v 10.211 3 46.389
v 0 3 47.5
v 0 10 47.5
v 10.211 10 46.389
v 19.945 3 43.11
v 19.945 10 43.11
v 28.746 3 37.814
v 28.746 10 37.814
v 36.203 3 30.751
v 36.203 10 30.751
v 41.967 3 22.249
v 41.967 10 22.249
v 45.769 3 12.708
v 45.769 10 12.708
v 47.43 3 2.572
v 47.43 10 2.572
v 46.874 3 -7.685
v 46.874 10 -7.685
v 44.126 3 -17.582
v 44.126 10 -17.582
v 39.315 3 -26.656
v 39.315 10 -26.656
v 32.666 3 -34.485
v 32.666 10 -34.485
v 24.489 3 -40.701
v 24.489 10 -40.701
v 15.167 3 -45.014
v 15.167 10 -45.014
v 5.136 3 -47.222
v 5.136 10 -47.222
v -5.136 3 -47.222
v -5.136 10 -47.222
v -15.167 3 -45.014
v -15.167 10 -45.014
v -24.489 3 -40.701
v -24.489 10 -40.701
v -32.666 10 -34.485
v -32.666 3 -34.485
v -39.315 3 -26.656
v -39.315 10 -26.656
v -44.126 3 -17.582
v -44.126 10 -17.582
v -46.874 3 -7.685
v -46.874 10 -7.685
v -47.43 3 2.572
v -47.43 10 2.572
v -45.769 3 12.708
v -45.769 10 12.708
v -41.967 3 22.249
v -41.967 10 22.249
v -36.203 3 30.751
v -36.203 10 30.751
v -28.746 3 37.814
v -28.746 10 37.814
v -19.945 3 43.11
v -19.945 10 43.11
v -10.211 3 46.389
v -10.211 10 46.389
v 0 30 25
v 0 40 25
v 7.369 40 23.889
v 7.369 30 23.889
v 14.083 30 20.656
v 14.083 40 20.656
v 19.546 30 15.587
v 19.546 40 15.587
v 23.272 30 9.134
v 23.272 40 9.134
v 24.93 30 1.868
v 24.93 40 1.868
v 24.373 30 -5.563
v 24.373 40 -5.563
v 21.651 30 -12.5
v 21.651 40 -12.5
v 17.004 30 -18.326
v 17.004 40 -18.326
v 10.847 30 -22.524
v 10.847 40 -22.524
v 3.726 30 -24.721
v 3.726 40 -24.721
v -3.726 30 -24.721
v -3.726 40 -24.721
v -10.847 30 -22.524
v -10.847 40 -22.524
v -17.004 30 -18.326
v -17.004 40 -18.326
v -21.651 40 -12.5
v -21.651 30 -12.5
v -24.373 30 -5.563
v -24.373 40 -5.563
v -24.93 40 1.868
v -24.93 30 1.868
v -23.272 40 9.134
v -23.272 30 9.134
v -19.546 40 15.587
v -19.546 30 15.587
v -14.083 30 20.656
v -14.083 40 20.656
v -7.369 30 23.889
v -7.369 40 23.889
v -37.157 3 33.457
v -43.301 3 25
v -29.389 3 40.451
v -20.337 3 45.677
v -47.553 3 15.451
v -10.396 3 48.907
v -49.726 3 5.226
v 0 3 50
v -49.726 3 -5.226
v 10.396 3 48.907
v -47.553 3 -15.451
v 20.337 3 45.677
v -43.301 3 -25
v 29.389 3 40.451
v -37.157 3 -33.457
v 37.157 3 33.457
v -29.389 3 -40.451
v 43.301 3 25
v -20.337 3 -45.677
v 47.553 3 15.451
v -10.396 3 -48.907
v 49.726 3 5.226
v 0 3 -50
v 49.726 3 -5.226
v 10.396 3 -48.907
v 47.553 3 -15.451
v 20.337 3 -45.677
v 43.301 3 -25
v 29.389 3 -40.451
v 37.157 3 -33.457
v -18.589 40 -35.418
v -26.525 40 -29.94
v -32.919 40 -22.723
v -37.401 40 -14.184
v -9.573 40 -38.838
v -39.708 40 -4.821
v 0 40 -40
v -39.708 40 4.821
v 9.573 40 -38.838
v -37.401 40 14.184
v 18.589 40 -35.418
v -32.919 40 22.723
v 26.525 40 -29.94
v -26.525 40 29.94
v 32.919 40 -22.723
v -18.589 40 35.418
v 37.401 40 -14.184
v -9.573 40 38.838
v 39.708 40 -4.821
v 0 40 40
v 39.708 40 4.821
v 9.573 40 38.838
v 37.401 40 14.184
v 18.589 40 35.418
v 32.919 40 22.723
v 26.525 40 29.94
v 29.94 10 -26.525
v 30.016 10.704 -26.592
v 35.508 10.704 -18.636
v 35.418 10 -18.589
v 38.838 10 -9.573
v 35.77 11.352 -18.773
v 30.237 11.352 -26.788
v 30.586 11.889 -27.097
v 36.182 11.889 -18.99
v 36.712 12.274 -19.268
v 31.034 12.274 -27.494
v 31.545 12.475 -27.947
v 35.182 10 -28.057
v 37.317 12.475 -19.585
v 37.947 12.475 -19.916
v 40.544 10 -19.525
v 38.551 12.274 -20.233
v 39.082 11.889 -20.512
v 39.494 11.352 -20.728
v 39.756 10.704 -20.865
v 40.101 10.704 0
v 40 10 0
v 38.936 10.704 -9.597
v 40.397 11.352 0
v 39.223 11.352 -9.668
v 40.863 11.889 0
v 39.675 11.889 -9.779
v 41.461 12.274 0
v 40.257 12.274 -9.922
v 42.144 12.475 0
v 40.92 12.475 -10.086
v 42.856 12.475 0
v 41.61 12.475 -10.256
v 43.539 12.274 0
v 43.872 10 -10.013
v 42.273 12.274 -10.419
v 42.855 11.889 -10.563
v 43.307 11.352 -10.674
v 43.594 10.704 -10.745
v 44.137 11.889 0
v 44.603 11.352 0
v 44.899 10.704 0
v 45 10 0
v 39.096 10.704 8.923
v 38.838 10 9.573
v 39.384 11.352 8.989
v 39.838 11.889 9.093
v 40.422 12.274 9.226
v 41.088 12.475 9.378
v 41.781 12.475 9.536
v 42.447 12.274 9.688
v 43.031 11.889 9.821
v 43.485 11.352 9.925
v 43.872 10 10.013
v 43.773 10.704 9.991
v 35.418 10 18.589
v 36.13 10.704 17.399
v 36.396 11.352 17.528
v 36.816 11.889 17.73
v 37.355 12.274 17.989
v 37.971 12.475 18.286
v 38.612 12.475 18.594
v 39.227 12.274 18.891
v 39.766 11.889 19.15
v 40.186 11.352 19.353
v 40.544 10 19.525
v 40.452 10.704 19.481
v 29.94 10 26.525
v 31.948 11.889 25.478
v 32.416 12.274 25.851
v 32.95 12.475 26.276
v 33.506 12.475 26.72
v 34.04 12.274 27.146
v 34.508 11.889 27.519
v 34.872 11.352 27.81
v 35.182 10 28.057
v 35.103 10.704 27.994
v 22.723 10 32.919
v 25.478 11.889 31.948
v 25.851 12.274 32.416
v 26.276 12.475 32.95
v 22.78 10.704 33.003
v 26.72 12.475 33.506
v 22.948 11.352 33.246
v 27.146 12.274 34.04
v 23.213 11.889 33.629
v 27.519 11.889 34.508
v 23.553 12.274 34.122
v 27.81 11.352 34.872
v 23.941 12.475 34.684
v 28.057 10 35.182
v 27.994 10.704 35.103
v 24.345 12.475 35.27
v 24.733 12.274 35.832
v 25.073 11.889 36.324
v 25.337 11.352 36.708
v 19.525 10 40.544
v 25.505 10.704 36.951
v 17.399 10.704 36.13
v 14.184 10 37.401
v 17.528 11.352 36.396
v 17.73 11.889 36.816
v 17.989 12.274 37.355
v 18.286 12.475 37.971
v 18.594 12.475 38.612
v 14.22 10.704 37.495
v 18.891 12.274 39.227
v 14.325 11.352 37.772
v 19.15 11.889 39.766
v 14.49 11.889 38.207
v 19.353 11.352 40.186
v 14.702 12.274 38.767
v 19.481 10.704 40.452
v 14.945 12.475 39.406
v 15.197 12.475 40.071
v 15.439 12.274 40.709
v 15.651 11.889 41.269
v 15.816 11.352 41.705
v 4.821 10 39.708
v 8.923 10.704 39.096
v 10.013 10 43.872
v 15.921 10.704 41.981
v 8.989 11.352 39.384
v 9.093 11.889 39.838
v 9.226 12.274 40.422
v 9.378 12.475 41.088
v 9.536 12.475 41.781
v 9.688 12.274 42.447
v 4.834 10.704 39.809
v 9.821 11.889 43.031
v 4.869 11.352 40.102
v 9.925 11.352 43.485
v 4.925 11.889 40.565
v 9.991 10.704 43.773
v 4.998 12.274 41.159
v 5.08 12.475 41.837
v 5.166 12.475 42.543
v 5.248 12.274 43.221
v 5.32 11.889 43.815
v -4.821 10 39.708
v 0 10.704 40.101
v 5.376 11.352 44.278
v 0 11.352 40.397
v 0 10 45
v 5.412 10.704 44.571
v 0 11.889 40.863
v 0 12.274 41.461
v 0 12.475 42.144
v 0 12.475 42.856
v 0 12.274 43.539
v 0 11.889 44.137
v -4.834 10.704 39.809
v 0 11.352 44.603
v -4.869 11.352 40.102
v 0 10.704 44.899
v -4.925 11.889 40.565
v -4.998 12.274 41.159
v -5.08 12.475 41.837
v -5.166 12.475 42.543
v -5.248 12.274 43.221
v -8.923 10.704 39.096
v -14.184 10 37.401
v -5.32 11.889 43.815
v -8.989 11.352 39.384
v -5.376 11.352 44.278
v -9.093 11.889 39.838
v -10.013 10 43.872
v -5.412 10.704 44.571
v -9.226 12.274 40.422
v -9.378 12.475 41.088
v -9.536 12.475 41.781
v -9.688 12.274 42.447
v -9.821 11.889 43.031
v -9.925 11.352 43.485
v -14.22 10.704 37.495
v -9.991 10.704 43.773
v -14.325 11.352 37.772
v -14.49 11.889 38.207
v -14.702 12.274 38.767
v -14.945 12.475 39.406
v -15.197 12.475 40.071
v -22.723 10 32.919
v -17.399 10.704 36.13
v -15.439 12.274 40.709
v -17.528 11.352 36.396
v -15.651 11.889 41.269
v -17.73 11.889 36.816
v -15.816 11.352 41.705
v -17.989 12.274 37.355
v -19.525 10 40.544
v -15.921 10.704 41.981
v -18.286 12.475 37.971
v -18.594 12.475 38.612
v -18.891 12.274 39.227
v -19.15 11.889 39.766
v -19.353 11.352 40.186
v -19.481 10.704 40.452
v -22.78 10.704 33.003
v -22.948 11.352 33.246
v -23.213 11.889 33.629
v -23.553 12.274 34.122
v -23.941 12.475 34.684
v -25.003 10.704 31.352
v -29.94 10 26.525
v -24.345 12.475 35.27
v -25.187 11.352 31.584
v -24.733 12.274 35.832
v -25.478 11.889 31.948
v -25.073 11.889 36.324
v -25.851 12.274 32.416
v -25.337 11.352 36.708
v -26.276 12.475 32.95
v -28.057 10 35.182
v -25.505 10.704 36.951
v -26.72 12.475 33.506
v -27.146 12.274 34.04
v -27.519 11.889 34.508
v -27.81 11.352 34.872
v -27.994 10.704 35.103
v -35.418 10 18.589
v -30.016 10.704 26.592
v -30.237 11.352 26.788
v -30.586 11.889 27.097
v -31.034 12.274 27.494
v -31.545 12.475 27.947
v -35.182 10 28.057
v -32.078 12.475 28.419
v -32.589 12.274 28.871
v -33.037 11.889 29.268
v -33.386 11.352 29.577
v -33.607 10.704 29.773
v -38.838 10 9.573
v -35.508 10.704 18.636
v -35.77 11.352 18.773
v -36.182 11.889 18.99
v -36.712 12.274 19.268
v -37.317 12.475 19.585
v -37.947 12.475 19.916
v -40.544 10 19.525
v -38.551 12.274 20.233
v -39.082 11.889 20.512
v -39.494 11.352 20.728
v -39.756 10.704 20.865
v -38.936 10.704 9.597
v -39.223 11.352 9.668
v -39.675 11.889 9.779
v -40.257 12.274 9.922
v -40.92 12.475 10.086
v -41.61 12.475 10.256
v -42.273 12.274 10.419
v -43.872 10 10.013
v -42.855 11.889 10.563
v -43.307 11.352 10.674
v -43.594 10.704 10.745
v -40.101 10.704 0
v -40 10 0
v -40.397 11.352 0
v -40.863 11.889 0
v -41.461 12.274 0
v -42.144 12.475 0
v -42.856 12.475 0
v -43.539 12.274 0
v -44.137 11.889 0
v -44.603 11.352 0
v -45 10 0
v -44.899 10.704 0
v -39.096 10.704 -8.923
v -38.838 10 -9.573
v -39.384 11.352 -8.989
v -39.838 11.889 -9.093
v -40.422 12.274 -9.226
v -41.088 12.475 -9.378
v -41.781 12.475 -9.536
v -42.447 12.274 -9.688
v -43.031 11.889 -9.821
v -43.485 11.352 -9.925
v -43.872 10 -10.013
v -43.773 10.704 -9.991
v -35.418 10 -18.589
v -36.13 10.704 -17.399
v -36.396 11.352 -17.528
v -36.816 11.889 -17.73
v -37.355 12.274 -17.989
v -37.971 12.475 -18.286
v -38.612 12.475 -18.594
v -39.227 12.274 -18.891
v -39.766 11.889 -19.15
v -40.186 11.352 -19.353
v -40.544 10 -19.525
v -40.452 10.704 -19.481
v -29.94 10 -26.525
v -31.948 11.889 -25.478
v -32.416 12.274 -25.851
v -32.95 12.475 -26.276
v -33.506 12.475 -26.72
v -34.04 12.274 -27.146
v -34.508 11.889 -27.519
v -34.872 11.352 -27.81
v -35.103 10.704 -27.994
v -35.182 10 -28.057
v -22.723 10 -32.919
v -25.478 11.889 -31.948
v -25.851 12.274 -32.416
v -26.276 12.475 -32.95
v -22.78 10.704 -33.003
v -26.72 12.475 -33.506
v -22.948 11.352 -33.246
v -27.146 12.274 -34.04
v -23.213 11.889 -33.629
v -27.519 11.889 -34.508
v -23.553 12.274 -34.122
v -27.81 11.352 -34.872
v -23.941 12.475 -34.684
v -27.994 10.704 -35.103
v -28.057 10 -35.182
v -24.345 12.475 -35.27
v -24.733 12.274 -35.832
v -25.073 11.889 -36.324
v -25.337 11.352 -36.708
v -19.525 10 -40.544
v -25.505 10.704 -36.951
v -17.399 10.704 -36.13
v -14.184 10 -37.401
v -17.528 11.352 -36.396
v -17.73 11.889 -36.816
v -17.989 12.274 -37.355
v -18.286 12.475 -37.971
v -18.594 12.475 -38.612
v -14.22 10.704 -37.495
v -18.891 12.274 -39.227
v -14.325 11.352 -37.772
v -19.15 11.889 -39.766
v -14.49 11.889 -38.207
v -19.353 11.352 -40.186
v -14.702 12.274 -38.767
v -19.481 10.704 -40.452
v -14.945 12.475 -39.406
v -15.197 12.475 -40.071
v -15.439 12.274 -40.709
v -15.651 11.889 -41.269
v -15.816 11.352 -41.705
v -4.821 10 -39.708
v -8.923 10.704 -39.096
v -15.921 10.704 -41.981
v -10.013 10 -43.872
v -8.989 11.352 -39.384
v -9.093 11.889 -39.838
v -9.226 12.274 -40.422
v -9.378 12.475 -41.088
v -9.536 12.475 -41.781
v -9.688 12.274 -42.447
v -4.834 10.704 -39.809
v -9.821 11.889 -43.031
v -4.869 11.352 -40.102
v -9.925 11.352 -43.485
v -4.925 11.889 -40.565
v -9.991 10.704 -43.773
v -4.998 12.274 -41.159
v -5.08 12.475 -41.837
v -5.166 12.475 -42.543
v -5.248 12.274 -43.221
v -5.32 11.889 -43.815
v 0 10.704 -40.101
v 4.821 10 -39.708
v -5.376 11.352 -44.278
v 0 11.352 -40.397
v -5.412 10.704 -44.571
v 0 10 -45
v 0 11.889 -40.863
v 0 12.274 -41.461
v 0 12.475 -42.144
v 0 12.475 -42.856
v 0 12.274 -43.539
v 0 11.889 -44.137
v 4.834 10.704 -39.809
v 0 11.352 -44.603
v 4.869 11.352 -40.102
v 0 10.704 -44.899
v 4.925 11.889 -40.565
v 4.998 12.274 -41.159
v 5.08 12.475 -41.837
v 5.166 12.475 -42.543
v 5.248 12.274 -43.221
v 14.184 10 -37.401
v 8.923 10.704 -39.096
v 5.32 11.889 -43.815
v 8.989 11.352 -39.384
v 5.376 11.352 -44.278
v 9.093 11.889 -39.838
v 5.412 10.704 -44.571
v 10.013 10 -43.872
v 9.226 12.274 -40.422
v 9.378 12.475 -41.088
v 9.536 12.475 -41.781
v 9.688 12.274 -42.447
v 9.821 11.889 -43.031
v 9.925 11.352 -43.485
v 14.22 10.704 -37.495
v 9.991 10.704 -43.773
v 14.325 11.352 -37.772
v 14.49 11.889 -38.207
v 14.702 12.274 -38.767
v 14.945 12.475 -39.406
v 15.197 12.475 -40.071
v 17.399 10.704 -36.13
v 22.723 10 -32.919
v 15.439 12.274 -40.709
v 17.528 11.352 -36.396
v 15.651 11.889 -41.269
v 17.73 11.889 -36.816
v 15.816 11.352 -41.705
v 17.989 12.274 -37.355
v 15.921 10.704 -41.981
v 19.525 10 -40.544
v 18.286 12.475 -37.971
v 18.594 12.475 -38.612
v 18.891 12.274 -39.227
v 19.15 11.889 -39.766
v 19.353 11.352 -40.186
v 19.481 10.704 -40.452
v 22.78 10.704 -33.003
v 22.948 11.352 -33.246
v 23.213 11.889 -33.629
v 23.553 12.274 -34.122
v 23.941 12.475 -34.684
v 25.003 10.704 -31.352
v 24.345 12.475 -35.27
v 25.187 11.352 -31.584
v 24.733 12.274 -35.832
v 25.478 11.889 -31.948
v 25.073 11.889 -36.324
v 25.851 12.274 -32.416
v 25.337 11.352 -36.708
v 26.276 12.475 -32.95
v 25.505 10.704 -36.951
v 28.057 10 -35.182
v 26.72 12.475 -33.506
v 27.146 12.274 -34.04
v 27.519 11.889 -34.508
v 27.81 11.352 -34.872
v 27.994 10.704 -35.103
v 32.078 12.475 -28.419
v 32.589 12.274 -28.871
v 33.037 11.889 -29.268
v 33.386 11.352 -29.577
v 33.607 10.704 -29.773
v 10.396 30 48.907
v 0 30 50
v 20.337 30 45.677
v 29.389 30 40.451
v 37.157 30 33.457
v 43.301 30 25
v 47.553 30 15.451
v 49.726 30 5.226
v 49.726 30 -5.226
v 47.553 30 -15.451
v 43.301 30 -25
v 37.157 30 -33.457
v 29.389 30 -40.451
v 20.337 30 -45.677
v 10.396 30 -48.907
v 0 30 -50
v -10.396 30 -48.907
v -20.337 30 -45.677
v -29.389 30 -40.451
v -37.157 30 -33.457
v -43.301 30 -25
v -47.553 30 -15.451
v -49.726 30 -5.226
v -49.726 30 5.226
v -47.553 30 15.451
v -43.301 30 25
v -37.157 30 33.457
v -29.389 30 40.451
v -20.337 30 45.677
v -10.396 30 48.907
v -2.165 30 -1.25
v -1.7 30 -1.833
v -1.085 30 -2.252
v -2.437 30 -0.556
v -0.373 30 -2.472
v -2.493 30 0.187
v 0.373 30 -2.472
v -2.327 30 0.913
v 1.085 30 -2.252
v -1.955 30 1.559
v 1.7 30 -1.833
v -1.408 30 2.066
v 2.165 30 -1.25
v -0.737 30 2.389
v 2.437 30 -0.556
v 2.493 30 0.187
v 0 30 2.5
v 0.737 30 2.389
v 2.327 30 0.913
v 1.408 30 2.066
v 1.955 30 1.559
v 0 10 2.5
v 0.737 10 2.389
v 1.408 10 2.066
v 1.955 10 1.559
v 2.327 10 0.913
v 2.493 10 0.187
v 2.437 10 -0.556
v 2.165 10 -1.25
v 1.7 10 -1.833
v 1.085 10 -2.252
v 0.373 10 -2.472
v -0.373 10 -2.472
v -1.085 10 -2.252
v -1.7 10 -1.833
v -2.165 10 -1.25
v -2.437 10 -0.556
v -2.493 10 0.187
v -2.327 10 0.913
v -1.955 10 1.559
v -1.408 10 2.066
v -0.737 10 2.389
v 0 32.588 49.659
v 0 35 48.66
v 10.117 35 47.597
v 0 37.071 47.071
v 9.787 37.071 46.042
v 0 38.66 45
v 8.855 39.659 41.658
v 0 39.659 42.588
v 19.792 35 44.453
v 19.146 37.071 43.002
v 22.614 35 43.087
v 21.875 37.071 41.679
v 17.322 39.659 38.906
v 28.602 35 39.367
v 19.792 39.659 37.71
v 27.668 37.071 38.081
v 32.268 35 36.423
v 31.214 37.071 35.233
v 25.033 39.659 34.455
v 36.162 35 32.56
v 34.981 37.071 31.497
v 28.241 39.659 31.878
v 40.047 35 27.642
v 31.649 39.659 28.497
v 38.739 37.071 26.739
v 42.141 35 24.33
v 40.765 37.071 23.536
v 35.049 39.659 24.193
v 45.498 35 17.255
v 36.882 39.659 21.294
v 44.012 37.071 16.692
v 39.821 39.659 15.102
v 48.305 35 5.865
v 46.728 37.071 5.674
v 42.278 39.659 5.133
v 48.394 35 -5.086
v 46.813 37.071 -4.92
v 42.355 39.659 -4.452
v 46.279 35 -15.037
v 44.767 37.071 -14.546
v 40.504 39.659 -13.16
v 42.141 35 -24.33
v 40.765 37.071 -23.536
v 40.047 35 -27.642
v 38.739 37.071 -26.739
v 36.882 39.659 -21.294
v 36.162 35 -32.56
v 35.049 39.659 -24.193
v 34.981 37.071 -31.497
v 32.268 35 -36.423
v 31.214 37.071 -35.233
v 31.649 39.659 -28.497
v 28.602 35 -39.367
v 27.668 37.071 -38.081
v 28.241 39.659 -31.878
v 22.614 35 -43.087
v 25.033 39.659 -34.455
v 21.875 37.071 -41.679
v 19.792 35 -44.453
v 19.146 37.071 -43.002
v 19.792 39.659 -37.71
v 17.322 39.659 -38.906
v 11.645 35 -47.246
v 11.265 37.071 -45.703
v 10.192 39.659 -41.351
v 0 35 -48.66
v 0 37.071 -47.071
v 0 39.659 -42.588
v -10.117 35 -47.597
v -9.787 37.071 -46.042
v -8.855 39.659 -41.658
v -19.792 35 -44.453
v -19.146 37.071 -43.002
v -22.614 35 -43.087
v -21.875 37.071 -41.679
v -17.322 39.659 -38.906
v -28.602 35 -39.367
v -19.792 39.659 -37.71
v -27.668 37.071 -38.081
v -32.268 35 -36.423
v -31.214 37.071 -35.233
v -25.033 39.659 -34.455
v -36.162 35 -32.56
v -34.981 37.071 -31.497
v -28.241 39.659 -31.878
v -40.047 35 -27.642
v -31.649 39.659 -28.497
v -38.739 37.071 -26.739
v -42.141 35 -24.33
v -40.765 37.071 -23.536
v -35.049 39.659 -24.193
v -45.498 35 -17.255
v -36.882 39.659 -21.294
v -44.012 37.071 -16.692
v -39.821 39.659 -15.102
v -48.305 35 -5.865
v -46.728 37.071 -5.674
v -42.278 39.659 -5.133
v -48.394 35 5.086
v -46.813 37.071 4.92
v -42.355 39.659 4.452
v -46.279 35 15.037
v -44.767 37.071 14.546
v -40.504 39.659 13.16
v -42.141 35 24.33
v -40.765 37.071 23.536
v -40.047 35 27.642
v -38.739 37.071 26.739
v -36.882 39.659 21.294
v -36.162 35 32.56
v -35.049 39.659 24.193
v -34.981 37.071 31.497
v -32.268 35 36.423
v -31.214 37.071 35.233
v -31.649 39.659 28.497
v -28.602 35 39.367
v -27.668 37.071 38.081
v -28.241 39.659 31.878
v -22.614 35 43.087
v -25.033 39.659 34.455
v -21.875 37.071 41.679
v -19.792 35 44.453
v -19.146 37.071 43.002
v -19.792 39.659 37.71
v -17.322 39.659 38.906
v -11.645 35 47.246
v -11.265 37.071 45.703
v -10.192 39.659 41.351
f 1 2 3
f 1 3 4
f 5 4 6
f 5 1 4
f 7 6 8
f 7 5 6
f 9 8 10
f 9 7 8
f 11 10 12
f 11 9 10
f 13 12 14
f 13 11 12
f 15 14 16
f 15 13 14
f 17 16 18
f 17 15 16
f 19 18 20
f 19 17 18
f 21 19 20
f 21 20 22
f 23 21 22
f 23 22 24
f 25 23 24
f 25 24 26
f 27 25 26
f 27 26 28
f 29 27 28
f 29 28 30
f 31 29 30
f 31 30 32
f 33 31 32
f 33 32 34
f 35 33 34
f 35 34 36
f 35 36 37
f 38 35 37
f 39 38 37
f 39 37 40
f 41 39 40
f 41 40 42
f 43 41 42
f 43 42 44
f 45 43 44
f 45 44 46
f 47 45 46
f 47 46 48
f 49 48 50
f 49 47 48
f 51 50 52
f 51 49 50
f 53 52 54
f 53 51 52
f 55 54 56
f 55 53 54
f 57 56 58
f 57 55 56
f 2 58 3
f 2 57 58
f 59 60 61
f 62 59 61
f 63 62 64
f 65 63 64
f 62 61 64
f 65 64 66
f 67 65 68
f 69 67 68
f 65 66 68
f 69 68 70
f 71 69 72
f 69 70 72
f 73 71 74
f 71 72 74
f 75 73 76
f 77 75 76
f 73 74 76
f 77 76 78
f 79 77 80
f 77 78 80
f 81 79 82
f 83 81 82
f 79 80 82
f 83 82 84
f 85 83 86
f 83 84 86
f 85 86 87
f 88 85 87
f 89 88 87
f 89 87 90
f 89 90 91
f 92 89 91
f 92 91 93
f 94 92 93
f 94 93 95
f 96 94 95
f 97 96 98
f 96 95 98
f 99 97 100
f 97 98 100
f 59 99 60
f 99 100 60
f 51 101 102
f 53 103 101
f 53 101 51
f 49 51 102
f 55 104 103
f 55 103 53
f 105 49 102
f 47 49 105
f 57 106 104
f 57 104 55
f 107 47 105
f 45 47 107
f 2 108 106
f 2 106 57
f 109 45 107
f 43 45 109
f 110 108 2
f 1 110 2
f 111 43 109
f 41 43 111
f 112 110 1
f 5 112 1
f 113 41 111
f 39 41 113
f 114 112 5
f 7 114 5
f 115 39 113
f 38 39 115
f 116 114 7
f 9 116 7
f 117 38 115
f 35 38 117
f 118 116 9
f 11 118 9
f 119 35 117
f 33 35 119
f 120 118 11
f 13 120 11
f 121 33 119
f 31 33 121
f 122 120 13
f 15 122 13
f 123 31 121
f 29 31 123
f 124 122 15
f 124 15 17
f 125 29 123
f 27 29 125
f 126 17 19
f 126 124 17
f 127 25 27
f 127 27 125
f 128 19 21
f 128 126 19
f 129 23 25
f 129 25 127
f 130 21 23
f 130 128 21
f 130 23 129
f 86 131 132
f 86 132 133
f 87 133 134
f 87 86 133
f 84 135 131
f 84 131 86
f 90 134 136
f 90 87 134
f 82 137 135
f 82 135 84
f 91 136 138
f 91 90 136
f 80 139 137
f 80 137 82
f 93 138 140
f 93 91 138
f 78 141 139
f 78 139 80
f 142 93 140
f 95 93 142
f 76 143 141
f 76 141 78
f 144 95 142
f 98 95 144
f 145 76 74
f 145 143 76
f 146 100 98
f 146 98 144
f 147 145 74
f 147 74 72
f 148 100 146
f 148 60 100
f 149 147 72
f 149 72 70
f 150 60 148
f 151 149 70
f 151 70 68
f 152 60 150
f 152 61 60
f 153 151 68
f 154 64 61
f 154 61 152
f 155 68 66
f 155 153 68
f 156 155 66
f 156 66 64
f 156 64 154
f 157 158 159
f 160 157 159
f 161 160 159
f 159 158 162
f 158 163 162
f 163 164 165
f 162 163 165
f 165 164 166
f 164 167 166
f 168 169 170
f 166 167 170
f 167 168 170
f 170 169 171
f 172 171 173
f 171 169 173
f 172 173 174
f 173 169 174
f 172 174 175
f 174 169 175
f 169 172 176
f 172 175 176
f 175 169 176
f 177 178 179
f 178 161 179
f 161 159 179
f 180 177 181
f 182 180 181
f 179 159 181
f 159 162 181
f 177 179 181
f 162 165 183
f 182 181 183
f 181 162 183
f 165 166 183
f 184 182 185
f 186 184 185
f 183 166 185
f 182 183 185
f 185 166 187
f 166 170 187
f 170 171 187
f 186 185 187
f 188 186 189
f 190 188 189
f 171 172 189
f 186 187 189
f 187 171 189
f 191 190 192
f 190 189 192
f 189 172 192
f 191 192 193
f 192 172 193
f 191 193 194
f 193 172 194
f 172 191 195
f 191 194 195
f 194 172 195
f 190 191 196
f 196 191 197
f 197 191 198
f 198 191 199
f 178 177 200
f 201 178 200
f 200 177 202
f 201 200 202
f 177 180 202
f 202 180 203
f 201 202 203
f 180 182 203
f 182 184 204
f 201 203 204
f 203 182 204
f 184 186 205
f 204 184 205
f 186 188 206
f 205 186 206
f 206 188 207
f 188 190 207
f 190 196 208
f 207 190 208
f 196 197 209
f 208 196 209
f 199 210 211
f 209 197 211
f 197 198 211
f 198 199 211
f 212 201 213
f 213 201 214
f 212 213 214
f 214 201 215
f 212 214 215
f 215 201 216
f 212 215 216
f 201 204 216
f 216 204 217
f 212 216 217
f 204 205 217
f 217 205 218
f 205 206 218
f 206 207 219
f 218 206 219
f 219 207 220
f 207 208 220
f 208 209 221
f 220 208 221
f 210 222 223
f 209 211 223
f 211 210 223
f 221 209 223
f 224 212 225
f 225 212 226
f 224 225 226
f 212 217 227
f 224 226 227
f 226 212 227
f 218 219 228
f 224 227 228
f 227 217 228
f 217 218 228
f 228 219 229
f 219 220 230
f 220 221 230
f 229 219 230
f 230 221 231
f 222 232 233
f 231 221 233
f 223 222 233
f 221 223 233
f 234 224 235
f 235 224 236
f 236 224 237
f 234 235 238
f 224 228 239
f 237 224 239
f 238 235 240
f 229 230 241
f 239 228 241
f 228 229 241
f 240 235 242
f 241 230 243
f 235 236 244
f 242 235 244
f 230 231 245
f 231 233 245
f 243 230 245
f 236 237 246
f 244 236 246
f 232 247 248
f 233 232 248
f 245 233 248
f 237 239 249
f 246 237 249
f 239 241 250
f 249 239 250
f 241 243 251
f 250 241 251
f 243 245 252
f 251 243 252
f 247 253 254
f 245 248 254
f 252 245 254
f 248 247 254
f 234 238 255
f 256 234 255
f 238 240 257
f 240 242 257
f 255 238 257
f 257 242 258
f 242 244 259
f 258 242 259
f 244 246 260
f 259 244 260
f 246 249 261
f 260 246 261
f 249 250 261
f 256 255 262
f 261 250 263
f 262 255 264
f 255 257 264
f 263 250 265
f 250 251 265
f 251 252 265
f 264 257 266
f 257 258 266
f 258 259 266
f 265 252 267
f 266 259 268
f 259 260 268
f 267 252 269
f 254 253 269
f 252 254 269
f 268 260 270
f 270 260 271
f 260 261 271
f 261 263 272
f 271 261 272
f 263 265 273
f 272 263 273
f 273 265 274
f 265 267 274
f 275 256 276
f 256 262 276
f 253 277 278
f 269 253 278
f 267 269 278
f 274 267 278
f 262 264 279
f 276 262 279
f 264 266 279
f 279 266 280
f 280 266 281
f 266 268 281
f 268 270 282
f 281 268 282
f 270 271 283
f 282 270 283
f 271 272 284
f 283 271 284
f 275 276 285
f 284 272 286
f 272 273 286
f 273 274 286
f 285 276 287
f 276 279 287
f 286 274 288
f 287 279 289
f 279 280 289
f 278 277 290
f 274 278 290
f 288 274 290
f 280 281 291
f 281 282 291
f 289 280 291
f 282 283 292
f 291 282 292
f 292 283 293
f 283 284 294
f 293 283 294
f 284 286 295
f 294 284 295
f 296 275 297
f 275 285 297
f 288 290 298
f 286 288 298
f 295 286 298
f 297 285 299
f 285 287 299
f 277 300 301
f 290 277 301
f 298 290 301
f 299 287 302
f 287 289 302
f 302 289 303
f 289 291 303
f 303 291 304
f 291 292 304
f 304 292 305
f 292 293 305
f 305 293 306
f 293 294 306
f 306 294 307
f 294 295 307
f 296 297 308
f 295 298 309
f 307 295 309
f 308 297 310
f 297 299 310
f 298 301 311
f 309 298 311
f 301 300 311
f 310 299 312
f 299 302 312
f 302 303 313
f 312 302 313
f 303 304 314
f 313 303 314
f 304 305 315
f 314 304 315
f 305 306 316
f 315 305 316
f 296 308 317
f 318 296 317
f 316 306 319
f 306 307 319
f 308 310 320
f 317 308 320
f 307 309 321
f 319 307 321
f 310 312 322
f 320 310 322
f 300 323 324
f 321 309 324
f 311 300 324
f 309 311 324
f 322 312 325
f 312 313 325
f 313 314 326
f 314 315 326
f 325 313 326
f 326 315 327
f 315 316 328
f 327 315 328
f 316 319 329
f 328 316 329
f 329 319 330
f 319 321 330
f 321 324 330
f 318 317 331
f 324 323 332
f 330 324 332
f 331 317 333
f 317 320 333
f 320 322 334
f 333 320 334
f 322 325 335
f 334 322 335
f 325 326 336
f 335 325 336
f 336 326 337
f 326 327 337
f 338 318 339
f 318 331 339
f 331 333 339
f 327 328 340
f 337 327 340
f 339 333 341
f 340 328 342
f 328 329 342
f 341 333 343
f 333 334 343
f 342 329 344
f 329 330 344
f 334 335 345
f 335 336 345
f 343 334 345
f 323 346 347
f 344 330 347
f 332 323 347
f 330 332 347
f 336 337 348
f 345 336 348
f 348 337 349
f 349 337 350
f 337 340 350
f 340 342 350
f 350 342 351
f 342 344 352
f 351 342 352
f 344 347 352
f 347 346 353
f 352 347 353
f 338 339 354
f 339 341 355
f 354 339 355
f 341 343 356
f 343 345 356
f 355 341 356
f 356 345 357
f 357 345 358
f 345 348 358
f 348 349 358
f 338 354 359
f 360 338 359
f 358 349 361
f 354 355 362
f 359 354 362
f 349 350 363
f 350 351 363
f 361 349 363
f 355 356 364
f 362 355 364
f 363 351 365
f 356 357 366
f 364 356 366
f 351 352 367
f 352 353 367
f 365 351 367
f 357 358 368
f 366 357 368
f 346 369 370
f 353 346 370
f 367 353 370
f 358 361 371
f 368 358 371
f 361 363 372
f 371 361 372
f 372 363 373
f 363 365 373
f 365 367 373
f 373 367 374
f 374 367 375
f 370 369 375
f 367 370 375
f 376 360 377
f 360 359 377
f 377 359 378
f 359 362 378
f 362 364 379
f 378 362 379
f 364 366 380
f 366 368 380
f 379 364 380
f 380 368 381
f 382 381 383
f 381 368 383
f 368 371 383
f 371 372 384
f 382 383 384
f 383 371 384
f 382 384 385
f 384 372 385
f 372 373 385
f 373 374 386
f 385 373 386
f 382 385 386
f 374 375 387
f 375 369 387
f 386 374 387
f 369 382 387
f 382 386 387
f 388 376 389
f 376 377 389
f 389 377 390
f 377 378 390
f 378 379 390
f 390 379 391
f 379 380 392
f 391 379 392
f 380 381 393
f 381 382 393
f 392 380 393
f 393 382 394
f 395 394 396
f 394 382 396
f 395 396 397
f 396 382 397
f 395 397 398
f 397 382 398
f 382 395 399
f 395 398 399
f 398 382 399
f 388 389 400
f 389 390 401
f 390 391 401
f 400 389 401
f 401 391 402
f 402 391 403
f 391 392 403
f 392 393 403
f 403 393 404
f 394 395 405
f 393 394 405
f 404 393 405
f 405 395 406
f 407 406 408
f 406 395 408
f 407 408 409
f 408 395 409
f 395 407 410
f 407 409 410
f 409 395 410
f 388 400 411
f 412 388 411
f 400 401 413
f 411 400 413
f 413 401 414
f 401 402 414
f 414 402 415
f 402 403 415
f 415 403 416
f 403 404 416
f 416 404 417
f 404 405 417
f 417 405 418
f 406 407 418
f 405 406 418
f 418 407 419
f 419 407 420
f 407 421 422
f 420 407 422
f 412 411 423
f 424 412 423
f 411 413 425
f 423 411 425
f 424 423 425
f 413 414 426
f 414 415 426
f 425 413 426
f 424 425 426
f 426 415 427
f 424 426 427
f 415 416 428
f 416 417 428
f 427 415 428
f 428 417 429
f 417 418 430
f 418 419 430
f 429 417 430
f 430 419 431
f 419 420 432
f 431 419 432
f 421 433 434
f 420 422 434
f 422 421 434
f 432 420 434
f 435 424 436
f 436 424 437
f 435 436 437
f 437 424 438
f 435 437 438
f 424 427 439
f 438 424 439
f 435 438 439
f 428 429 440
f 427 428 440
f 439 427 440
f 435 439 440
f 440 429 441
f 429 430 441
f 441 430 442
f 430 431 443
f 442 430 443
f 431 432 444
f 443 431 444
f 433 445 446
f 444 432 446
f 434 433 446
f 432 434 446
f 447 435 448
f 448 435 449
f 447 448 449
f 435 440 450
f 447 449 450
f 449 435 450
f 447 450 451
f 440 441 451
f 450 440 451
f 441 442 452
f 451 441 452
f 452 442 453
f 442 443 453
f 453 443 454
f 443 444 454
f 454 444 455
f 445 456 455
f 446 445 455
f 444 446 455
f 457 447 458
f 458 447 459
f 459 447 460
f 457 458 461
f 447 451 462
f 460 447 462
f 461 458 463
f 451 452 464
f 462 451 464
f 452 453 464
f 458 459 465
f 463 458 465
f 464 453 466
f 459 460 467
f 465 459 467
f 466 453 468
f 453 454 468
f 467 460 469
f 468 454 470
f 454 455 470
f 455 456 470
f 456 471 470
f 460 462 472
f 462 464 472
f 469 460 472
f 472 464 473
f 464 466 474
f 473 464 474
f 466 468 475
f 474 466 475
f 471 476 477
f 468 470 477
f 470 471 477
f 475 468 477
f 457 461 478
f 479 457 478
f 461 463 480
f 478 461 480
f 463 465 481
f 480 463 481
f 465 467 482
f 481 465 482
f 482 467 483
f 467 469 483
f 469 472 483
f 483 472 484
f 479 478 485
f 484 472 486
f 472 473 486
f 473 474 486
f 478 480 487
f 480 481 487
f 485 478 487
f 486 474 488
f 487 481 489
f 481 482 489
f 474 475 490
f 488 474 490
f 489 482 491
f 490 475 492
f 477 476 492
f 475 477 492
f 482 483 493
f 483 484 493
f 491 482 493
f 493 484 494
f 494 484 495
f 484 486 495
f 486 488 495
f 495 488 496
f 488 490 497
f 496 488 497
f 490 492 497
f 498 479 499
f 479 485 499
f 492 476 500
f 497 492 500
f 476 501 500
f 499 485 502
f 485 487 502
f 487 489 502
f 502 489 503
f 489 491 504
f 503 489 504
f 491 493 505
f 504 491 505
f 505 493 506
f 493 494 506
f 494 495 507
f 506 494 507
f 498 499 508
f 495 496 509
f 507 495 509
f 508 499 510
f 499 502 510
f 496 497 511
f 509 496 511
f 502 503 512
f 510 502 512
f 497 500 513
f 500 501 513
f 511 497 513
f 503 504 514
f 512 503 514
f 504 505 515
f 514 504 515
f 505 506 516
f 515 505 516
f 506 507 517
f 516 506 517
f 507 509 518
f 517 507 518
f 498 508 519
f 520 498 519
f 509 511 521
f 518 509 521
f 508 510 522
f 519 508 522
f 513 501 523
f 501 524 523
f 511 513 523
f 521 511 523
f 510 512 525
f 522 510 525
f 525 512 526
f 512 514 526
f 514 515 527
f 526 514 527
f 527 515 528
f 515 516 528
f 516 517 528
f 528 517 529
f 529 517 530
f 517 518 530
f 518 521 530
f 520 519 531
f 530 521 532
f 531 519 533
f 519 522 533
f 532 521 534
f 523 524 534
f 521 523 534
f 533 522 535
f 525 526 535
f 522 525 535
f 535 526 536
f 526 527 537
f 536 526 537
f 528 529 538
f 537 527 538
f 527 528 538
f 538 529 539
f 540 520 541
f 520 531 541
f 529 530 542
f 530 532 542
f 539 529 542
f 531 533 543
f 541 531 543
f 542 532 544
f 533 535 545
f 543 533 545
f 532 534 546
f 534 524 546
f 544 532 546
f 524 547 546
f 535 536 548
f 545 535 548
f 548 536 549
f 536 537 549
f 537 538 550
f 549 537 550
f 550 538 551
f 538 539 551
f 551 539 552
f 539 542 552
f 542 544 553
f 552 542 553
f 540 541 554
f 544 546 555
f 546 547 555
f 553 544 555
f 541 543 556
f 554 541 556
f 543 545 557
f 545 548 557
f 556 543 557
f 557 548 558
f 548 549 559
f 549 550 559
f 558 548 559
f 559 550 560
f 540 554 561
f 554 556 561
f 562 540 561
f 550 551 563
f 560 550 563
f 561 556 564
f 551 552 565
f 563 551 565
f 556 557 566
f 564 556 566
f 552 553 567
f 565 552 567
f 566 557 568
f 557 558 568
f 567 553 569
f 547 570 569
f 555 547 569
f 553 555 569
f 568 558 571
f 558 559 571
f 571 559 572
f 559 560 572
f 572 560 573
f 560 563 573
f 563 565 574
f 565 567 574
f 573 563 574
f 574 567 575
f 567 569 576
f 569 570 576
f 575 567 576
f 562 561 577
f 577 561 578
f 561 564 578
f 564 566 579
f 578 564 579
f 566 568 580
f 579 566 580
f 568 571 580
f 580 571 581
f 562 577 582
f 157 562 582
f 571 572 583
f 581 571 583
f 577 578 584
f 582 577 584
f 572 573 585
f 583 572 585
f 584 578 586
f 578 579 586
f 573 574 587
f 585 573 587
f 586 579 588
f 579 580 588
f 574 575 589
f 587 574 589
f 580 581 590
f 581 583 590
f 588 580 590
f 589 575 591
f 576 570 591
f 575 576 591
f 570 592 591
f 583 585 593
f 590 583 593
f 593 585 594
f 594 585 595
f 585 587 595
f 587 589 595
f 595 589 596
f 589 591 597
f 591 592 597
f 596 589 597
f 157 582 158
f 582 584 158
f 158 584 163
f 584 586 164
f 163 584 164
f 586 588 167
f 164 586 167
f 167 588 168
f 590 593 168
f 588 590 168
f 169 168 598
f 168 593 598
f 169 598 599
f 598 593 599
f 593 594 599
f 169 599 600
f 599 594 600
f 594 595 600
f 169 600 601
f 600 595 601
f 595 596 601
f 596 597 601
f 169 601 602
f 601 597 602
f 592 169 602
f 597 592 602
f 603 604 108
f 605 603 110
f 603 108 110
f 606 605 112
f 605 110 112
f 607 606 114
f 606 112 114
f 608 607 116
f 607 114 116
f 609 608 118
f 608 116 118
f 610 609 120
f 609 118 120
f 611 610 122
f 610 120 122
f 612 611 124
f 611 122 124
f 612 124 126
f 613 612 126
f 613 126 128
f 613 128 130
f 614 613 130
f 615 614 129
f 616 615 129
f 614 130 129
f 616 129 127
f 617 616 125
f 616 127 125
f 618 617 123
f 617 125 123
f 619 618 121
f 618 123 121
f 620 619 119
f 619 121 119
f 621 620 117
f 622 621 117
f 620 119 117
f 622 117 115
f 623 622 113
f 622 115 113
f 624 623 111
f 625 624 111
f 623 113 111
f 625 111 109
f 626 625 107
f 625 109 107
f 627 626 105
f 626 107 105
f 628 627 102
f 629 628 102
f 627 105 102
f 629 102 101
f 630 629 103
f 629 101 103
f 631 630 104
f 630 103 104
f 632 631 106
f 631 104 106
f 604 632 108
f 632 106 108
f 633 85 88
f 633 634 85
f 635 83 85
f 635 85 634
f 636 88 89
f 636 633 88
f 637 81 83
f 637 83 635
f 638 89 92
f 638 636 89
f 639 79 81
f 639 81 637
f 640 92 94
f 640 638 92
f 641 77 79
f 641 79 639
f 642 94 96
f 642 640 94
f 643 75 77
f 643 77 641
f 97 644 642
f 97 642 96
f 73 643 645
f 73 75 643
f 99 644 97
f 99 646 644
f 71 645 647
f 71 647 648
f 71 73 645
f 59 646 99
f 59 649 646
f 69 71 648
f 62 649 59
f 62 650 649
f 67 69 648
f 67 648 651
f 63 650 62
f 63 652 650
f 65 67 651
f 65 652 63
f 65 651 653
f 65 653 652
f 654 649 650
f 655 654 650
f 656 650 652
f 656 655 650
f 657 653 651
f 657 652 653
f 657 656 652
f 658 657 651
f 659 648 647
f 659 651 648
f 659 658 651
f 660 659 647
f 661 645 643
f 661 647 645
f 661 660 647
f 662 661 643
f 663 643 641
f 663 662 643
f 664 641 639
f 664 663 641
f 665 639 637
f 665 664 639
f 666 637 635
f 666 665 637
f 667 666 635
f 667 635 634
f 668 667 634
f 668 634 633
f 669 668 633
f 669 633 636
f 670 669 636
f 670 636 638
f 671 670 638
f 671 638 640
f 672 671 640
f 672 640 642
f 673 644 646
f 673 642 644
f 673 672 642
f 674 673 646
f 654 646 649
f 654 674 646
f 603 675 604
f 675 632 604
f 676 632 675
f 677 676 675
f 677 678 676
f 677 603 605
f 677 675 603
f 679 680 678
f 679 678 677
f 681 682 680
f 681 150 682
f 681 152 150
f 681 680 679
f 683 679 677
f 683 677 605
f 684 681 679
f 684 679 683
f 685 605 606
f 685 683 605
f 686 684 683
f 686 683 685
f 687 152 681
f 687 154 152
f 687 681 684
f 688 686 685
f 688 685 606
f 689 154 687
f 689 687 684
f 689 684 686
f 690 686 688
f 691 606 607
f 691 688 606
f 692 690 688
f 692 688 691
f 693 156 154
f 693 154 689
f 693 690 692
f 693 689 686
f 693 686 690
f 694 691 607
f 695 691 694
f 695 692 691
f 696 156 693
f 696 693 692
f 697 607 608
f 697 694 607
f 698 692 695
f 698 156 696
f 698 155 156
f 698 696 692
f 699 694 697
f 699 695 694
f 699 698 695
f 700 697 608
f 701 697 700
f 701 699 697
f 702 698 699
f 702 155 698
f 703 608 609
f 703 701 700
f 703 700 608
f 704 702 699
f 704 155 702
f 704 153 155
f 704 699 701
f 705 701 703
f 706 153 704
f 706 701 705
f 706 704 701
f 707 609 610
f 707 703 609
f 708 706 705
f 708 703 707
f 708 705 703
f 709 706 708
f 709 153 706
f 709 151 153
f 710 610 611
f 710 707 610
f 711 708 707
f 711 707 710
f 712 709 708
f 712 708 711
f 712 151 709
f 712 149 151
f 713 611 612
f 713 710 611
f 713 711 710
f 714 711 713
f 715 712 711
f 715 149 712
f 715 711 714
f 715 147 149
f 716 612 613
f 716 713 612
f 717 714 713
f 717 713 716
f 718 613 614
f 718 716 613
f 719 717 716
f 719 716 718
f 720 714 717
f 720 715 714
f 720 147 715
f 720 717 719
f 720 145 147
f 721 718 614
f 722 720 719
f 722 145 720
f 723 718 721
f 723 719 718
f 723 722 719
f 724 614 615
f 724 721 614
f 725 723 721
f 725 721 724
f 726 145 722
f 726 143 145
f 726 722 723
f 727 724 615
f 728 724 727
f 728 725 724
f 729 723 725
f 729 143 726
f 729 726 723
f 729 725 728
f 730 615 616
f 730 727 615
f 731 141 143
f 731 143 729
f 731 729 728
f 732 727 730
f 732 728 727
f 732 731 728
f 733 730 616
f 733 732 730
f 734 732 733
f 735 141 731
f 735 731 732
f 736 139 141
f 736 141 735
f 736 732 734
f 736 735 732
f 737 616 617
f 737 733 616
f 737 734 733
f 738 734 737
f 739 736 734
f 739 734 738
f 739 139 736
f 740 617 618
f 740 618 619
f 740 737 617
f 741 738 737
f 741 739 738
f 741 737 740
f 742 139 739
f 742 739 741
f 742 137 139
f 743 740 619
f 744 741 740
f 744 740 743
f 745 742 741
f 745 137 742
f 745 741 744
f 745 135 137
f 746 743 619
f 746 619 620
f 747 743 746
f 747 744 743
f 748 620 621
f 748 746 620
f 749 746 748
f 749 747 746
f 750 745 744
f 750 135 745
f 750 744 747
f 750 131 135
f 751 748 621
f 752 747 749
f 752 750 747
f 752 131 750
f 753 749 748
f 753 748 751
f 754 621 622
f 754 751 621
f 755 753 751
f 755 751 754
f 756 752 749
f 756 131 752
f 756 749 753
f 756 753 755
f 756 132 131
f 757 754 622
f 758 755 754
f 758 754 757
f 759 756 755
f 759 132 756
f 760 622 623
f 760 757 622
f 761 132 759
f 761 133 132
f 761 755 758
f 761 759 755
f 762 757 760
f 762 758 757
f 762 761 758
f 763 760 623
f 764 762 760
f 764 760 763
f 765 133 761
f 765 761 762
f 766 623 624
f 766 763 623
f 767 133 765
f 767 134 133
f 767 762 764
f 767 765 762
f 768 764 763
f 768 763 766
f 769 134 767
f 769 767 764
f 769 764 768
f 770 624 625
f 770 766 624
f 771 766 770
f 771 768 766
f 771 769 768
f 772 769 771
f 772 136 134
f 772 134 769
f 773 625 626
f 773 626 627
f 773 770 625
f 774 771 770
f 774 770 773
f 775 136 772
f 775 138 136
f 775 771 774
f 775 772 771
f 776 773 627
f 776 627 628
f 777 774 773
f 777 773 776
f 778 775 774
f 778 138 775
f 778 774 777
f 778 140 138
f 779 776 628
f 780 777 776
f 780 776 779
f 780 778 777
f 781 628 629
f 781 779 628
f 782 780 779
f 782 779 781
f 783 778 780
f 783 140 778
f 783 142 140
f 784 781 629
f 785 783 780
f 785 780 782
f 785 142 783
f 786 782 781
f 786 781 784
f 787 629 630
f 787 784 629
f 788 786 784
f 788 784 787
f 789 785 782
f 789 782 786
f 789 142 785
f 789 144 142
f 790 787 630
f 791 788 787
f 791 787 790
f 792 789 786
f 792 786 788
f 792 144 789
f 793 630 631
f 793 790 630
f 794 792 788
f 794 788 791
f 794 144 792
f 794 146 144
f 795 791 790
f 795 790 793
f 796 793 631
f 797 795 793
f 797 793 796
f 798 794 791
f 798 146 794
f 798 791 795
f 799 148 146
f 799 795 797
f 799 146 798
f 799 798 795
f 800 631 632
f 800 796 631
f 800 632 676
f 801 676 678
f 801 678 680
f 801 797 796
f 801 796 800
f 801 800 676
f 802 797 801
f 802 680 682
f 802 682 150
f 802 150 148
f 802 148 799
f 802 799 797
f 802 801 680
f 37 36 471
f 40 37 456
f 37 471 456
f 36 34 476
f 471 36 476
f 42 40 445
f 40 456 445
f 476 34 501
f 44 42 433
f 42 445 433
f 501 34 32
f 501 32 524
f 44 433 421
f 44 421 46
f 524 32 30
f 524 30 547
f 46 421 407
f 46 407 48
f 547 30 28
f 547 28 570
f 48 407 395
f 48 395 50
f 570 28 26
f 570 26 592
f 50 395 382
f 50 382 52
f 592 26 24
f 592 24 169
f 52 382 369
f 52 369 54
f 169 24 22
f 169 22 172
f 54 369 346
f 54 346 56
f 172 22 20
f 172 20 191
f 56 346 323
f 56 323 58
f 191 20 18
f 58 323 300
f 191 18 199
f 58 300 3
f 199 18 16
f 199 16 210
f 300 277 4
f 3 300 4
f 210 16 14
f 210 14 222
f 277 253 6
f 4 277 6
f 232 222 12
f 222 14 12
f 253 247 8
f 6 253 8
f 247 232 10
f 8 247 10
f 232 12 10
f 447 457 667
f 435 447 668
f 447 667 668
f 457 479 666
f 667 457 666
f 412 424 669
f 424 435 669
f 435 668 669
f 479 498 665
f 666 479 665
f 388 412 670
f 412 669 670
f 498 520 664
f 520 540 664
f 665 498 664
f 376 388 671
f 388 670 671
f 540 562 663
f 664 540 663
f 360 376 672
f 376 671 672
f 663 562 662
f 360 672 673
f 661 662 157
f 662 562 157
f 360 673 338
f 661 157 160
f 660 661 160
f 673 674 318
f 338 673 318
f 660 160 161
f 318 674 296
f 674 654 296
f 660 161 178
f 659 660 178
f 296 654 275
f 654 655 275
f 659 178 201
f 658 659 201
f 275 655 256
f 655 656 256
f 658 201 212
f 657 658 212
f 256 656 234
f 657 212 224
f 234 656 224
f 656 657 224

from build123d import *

# Parameters (mm, degrees)
SKETCH1_R               = 50
SKETCH1_R_2             = 47.5
BOSS_EXTRUDE1_DEPTH     = 10
SKETCH2_R               = 50
BOSS_EXTRUDE2_DEPTH     = 30
SKETCH4_R               = 2.5
SKETCH6_R               = 50
CUT_EXTRUDE2_DEPTH      = 3
CUT_EXTRUDE3_DEPTH      = 80.806014811
CUT_EXTRUDE3_DEPTH_BACK = 80.806014811
SKETCH7_R               = 2.5
FILLET1_R               = 10
SKETCH9_R               = 25
CUT_EXTRUDE5_DEPTH      = 10


with BuildPart() as part:
    # Sketch1 → Boss-Extrude1 (new body)
    with BuildSketch(Plane(origin=(0, 0, 0), x_dir=(1, 0, 0), z_dir=(0, 1, 0))):
        with Locations(Location((0, 0, 0), (0, 0, 270))):
            Circle(SKETCH1_R)
        with Locations(Location((0, 0, 0), (0, 0, 270))):
            Circle(SKETCH1_R_2, mode=Mode.SUBTRACT)
    extrude(amount=BOSS_EXTRUDE1_DEPTH)

    # Sketch2 → Boss-Extrude2 (add)
    with BuildSketch(Plane(origin=(0, 10, 0), x_dir=(1, 0, 0), z_dir=(0, 1, 0))):
        with Locations(Location((0, 0, 0), (0, 0, 270))):
            Circle(SKETCH2_R)
    extrude(amount=BOSS_EXTRUDE2_DEPTH)

    # Cut-Sweep1: sweep along a path in Sketch3
    with BuildLine(Plane.XZ.offset(-10)) as cut_sweep1_path:
        CenterArc((0, 0), 42.5, 0, 360)
    # Sketch4 → Cut-Sweep1 (sweep, cut)
    with BuildSketch(Plane.XY):
        with Locations((42.5, 10)):
            Circle(SKETCH4_R)
    sweep(path=cut_sweep1_path.line, mode=Mode.SUBTRACT)

    # Sketch6 → Cut-Extrude2 (cut)
    with BuildSketch(Plane.XZ):
        with Locations(Location((0, 0, 0), (0, 0, 270))):
            Circle(SKETCH6_R)
    extrude(amount=-CUT_EXTRUDE2_DEPTH, mode=Mode.SUBTRACT)

    # Sketch7 → Cut-Extrude3 (cut, two sides: drawn at the far end of the back side and taken through both)
    with BuildSketch(Plane(origin=(0, 40, 0), x_dir=(1, 0, 0), z_dir=(0, 1, 0)).offset(-CUT_EXTRUDE3_DEPTH_BACK)):
        with Locations(Location((0, 0, 0), (0, 0, 270))):
            Circle(SKETCH7_R)
    extrude(amount=CUT_EXTRUDE3_DEPTH + CUT_EXTRUDE3_DEPTH_BACK, mode=Mode.SUBTRACT)

    # Fillet1
    fillet1_edges = [part.edges().sort_by_distance(p)[0] for p in [
        (0, 40, -50),
    ]]
    fillet(fillet1_edges, radius=FILLET1_R)

    # Sketch9 → Cut-Extrude5 (cut)
    with BuildSketch(Plane(origin=(0, 40, 0), x_dir=(1, 0, 0), z_dir=(0, 1, 0))):
        with Locations(Location((0, 0, 0), (0, 0, 270))):
            Circle(SKETCH9_R)
    extrude(amount=-CUT_EXTRUDE5_DEPTH, mode=Mode.SUBTRACT)


solid = part.part
